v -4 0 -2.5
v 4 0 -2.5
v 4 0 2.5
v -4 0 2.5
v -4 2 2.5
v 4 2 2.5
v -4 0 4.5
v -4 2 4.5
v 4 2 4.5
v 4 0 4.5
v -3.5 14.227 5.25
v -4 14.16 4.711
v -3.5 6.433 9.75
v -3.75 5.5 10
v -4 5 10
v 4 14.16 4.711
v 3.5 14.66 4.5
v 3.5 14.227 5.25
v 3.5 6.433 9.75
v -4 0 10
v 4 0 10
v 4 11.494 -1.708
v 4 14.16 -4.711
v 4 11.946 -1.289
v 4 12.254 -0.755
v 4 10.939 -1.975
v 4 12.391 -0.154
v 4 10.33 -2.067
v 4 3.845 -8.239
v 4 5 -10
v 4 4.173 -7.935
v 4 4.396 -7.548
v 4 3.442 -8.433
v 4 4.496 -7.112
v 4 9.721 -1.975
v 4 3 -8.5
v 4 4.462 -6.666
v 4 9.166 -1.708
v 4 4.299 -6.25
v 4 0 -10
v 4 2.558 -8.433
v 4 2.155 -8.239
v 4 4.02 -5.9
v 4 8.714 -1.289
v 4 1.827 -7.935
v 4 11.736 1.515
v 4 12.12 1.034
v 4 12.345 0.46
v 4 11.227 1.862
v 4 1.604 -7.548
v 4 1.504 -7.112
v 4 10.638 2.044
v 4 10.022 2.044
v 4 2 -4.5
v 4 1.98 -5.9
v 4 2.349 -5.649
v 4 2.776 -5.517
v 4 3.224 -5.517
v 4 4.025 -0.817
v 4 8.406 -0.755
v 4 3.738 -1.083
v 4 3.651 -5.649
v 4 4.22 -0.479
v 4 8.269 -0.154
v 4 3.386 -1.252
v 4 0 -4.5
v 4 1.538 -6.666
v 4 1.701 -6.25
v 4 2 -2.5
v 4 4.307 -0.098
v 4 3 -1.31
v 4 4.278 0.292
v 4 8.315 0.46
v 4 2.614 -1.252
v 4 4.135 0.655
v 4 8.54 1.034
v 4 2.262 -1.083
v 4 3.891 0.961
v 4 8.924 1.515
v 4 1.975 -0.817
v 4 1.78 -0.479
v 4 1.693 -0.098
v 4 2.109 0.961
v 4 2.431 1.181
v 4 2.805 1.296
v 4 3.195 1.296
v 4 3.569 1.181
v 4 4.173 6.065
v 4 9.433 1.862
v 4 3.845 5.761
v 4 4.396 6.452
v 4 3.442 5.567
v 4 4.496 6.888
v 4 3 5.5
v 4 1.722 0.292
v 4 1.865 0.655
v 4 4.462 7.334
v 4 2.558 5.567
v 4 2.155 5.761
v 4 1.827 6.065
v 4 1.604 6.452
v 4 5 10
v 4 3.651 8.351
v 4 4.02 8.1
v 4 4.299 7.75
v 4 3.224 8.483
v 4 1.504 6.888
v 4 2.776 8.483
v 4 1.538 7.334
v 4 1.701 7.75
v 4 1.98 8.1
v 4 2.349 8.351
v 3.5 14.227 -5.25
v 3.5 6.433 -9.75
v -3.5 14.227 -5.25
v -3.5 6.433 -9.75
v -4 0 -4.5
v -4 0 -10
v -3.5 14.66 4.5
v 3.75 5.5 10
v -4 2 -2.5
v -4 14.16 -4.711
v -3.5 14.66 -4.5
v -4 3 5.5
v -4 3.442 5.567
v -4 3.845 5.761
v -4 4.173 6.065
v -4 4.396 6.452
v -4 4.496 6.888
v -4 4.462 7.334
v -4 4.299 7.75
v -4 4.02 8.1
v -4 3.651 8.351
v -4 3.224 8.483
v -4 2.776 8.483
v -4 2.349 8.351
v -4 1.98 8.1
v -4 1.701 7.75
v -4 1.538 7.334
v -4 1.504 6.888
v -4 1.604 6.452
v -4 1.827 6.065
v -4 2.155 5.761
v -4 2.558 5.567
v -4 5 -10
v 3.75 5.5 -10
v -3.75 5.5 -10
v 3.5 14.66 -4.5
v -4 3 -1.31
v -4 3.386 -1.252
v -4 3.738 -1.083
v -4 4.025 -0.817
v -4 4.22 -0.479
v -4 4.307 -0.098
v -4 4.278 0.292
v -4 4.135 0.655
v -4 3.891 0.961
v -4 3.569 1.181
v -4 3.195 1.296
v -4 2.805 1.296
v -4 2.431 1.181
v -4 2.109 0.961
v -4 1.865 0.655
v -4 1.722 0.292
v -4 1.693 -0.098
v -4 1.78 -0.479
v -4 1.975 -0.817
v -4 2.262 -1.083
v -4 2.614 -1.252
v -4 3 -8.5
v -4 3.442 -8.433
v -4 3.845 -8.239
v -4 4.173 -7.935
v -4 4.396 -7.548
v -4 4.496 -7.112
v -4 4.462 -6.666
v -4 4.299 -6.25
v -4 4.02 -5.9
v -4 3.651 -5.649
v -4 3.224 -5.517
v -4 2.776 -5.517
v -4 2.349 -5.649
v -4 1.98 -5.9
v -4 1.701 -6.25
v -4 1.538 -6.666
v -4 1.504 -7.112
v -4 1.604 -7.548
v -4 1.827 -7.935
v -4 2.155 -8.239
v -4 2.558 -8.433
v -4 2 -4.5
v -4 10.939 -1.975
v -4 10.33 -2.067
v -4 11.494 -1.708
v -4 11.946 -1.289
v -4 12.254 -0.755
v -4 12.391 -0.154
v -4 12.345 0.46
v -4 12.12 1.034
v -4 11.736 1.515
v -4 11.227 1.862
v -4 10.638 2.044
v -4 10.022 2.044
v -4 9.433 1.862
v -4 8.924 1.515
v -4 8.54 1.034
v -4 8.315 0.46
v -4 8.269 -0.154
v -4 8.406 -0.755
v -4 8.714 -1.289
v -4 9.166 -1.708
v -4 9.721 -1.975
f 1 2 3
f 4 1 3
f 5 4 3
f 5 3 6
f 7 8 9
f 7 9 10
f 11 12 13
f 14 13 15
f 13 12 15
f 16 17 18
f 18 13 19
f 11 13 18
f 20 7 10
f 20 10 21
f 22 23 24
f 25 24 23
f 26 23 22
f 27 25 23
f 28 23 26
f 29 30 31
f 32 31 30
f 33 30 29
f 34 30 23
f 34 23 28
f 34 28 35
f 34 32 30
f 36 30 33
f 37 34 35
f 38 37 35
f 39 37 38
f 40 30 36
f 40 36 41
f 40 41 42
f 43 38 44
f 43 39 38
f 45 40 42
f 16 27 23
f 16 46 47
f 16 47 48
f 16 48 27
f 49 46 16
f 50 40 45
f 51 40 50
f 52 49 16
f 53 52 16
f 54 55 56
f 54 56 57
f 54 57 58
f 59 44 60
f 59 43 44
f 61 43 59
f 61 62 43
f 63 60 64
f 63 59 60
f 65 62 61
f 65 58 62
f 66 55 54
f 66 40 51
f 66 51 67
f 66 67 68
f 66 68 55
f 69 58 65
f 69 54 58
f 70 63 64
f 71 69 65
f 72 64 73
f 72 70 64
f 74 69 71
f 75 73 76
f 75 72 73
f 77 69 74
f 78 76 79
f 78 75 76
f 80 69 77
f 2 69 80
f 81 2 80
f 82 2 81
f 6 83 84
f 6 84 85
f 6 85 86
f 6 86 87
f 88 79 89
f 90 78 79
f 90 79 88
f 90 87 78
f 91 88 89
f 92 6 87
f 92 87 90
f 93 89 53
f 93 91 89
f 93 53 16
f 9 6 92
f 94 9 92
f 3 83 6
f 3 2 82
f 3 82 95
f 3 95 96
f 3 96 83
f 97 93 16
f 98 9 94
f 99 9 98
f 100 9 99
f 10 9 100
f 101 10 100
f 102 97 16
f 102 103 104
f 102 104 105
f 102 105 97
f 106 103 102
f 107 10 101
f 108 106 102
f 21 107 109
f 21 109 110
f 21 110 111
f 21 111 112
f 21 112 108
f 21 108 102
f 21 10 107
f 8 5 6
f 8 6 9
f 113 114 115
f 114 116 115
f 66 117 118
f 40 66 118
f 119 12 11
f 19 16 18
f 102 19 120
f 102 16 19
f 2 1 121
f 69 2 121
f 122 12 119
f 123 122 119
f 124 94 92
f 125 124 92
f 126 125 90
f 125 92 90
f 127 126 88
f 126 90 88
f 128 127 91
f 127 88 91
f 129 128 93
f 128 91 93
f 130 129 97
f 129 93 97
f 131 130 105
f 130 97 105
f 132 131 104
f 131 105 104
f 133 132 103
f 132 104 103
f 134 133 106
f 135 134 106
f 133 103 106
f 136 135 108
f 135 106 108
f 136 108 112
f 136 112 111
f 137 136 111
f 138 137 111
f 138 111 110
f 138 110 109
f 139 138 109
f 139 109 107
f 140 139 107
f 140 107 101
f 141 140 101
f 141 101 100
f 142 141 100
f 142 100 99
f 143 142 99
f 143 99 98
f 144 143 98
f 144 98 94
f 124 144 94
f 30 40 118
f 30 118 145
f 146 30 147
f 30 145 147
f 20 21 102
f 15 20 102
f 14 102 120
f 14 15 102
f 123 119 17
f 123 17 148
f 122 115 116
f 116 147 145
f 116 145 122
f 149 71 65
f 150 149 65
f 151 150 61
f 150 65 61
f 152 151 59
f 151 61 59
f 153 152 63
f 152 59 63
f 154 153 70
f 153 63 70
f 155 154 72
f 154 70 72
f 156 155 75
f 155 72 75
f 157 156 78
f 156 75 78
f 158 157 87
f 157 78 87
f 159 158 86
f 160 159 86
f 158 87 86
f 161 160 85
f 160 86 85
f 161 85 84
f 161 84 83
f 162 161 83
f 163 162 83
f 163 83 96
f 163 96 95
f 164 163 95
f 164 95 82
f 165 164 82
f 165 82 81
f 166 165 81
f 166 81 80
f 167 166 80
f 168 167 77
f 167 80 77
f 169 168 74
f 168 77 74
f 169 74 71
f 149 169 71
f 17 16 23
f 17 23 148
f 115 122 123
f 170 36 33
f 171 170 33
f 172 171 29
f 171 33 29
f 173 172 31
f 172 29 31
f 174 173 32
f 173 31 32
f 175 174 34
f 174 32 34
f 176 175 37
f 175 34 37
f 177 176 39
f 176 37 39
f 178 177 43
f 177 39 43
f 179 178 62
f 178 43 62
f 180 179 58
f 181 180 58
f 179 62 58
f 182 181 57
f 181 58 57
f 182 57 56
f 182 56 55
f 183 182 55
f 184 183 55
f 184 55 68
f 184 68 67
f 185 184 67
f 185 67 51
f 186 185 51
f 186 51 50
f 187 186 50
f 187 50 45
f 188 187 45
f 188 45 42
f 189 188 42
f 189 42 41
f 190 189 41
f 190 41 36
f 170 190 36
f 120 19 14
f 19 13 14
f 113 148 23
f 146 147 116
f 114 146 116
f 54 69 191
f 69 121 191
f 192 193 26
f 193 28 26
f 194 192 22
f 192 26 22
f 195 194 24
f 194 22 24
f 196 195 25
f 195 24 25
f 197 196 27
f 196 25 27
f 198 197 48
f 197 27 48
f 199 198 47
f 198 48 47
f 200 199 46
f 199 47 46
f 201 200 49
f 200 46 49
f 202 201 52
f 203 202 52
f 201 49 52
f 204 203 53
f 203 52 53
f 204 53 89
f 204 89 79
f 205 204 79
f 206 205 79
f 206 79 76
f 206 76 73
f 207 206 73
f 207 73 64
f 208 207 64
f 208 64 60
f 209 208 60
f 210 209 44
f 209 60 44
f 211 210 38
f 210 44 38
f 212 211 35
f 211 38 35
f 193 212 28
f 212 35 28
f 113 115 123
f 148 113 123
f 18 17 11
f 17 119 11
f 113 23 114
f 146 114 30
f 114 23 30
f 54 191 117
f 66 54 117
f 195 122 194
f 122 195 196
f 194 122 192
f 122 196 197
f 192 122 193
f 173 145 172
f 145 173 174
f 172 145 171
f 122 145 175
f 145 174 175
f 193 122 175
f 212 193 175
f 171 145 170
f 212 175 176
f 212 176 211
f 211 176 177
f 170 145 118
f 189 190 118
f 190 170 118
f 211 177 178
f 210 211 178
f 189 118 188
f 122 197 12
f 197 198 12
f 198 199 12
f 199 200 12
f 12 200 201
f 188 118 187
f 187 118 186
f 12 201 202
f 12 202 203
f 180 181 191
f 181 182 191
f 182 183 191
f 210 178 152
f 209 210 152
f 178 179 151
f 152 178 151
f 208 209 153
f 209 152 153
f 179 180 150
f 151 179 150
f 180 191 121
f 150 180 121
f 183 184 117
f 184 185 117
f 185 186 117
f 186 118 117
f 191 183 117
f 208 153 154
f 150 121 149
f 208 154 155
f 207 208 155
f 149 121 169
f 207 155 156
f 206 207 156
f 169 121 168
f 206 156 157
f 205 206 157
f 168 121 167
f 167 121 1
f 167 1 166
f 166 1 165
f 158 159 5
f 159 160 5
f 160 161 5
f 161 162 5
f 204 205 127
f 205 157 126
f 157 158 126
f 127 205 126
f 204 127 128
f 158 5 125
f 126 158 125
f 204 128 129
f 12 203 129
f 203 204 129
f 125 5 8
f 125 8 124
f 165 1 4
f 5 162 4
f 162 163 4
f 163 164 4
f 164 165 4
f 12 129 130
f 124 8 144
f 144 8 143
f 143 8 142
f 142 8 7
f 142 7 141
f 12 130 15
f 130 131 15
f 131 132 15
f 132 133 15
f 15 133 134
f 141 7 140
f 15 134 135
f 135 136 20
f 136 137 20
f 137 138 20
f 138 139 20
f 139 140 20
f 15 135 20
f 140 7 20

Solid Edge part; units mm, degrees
sketch "Sketch1" plane through (0, 0, 0) normal (1, 0, 0) x (0, 1, 0)
  line L0 (0, -10) -> (6, -10)
  line L1 (6, -10) -> (14.6603, -5)
  line L2 (14.6603, 5) -> (14.6603, -5)
  line L3 (6, 10) -> (14.6603, 5)
  line L4 (0, 10) -> (6, 10)
  line L5 (0, 4.5) -> (0, 10)
  line L6 (2, 4.5) -> (0, 4.5)
  line L7 (2, 2.5) -> (2, 4.5)
  line L8 (0, 2.5) -> (2, 2.5)
  line L9 (0, 0) -> (0, 2.5)
  line L10 (0, 0) -> (0, -2.5)
  line L11 (0, -2.5) -> (2, -2.5)
  line L12 (2, -2.5) -> (2, -4.5)
  line L13 (2, -4.5) -> (0, -4.5)
  line L14 (0, -4.5) -> (0, -10)
  dimension "D1" = 6
  dimension "D2" = 10
  dimension "D3" = 2.5
  dimension "D4" = 2
  dimension "D5" = 2
  dimension "D6" = 2.5
  dimension "D7" = 2
  dimension "D8" = 2
  dimension "D9" = 5.5
  dimension "D10" = 5.5
extrude "Ajout_matière_1" add sketch "Sketch1" along normal mid plane 8
hole "Perçage_1" at (4, 3, 7) direction (-1, 0, 0) diameter 3 end up to next
hole "Hole1" at (4, 3, -7) direction (-1, 0, 0) diameter 3 end up to next
hole "Perçage_3" at (4, 3, 0) direction (-1, 0, 0) diameter 2.621 end up to next
hole "Perçage_4" at (4, 10.3301, 0) direction (-1, 0, 0) diameter 4.134 end up to next
chamfer "Chanfrein_1" distance 0.5 angle 45 10 edges at (-4, 14.6603, 0) (4, 14.6603, 0) (0, 14.6603, 5) (0, 14.6603, -5) (-4, 10.3301, 7.5) (4, 10.3301, 7.5) (-4, 10.3301, -7.5) (4, 10.3301, -7.5) (0, 6, 10) (0, 6, -10)
properties material "Aluminium AU4G, 2024_T4"
